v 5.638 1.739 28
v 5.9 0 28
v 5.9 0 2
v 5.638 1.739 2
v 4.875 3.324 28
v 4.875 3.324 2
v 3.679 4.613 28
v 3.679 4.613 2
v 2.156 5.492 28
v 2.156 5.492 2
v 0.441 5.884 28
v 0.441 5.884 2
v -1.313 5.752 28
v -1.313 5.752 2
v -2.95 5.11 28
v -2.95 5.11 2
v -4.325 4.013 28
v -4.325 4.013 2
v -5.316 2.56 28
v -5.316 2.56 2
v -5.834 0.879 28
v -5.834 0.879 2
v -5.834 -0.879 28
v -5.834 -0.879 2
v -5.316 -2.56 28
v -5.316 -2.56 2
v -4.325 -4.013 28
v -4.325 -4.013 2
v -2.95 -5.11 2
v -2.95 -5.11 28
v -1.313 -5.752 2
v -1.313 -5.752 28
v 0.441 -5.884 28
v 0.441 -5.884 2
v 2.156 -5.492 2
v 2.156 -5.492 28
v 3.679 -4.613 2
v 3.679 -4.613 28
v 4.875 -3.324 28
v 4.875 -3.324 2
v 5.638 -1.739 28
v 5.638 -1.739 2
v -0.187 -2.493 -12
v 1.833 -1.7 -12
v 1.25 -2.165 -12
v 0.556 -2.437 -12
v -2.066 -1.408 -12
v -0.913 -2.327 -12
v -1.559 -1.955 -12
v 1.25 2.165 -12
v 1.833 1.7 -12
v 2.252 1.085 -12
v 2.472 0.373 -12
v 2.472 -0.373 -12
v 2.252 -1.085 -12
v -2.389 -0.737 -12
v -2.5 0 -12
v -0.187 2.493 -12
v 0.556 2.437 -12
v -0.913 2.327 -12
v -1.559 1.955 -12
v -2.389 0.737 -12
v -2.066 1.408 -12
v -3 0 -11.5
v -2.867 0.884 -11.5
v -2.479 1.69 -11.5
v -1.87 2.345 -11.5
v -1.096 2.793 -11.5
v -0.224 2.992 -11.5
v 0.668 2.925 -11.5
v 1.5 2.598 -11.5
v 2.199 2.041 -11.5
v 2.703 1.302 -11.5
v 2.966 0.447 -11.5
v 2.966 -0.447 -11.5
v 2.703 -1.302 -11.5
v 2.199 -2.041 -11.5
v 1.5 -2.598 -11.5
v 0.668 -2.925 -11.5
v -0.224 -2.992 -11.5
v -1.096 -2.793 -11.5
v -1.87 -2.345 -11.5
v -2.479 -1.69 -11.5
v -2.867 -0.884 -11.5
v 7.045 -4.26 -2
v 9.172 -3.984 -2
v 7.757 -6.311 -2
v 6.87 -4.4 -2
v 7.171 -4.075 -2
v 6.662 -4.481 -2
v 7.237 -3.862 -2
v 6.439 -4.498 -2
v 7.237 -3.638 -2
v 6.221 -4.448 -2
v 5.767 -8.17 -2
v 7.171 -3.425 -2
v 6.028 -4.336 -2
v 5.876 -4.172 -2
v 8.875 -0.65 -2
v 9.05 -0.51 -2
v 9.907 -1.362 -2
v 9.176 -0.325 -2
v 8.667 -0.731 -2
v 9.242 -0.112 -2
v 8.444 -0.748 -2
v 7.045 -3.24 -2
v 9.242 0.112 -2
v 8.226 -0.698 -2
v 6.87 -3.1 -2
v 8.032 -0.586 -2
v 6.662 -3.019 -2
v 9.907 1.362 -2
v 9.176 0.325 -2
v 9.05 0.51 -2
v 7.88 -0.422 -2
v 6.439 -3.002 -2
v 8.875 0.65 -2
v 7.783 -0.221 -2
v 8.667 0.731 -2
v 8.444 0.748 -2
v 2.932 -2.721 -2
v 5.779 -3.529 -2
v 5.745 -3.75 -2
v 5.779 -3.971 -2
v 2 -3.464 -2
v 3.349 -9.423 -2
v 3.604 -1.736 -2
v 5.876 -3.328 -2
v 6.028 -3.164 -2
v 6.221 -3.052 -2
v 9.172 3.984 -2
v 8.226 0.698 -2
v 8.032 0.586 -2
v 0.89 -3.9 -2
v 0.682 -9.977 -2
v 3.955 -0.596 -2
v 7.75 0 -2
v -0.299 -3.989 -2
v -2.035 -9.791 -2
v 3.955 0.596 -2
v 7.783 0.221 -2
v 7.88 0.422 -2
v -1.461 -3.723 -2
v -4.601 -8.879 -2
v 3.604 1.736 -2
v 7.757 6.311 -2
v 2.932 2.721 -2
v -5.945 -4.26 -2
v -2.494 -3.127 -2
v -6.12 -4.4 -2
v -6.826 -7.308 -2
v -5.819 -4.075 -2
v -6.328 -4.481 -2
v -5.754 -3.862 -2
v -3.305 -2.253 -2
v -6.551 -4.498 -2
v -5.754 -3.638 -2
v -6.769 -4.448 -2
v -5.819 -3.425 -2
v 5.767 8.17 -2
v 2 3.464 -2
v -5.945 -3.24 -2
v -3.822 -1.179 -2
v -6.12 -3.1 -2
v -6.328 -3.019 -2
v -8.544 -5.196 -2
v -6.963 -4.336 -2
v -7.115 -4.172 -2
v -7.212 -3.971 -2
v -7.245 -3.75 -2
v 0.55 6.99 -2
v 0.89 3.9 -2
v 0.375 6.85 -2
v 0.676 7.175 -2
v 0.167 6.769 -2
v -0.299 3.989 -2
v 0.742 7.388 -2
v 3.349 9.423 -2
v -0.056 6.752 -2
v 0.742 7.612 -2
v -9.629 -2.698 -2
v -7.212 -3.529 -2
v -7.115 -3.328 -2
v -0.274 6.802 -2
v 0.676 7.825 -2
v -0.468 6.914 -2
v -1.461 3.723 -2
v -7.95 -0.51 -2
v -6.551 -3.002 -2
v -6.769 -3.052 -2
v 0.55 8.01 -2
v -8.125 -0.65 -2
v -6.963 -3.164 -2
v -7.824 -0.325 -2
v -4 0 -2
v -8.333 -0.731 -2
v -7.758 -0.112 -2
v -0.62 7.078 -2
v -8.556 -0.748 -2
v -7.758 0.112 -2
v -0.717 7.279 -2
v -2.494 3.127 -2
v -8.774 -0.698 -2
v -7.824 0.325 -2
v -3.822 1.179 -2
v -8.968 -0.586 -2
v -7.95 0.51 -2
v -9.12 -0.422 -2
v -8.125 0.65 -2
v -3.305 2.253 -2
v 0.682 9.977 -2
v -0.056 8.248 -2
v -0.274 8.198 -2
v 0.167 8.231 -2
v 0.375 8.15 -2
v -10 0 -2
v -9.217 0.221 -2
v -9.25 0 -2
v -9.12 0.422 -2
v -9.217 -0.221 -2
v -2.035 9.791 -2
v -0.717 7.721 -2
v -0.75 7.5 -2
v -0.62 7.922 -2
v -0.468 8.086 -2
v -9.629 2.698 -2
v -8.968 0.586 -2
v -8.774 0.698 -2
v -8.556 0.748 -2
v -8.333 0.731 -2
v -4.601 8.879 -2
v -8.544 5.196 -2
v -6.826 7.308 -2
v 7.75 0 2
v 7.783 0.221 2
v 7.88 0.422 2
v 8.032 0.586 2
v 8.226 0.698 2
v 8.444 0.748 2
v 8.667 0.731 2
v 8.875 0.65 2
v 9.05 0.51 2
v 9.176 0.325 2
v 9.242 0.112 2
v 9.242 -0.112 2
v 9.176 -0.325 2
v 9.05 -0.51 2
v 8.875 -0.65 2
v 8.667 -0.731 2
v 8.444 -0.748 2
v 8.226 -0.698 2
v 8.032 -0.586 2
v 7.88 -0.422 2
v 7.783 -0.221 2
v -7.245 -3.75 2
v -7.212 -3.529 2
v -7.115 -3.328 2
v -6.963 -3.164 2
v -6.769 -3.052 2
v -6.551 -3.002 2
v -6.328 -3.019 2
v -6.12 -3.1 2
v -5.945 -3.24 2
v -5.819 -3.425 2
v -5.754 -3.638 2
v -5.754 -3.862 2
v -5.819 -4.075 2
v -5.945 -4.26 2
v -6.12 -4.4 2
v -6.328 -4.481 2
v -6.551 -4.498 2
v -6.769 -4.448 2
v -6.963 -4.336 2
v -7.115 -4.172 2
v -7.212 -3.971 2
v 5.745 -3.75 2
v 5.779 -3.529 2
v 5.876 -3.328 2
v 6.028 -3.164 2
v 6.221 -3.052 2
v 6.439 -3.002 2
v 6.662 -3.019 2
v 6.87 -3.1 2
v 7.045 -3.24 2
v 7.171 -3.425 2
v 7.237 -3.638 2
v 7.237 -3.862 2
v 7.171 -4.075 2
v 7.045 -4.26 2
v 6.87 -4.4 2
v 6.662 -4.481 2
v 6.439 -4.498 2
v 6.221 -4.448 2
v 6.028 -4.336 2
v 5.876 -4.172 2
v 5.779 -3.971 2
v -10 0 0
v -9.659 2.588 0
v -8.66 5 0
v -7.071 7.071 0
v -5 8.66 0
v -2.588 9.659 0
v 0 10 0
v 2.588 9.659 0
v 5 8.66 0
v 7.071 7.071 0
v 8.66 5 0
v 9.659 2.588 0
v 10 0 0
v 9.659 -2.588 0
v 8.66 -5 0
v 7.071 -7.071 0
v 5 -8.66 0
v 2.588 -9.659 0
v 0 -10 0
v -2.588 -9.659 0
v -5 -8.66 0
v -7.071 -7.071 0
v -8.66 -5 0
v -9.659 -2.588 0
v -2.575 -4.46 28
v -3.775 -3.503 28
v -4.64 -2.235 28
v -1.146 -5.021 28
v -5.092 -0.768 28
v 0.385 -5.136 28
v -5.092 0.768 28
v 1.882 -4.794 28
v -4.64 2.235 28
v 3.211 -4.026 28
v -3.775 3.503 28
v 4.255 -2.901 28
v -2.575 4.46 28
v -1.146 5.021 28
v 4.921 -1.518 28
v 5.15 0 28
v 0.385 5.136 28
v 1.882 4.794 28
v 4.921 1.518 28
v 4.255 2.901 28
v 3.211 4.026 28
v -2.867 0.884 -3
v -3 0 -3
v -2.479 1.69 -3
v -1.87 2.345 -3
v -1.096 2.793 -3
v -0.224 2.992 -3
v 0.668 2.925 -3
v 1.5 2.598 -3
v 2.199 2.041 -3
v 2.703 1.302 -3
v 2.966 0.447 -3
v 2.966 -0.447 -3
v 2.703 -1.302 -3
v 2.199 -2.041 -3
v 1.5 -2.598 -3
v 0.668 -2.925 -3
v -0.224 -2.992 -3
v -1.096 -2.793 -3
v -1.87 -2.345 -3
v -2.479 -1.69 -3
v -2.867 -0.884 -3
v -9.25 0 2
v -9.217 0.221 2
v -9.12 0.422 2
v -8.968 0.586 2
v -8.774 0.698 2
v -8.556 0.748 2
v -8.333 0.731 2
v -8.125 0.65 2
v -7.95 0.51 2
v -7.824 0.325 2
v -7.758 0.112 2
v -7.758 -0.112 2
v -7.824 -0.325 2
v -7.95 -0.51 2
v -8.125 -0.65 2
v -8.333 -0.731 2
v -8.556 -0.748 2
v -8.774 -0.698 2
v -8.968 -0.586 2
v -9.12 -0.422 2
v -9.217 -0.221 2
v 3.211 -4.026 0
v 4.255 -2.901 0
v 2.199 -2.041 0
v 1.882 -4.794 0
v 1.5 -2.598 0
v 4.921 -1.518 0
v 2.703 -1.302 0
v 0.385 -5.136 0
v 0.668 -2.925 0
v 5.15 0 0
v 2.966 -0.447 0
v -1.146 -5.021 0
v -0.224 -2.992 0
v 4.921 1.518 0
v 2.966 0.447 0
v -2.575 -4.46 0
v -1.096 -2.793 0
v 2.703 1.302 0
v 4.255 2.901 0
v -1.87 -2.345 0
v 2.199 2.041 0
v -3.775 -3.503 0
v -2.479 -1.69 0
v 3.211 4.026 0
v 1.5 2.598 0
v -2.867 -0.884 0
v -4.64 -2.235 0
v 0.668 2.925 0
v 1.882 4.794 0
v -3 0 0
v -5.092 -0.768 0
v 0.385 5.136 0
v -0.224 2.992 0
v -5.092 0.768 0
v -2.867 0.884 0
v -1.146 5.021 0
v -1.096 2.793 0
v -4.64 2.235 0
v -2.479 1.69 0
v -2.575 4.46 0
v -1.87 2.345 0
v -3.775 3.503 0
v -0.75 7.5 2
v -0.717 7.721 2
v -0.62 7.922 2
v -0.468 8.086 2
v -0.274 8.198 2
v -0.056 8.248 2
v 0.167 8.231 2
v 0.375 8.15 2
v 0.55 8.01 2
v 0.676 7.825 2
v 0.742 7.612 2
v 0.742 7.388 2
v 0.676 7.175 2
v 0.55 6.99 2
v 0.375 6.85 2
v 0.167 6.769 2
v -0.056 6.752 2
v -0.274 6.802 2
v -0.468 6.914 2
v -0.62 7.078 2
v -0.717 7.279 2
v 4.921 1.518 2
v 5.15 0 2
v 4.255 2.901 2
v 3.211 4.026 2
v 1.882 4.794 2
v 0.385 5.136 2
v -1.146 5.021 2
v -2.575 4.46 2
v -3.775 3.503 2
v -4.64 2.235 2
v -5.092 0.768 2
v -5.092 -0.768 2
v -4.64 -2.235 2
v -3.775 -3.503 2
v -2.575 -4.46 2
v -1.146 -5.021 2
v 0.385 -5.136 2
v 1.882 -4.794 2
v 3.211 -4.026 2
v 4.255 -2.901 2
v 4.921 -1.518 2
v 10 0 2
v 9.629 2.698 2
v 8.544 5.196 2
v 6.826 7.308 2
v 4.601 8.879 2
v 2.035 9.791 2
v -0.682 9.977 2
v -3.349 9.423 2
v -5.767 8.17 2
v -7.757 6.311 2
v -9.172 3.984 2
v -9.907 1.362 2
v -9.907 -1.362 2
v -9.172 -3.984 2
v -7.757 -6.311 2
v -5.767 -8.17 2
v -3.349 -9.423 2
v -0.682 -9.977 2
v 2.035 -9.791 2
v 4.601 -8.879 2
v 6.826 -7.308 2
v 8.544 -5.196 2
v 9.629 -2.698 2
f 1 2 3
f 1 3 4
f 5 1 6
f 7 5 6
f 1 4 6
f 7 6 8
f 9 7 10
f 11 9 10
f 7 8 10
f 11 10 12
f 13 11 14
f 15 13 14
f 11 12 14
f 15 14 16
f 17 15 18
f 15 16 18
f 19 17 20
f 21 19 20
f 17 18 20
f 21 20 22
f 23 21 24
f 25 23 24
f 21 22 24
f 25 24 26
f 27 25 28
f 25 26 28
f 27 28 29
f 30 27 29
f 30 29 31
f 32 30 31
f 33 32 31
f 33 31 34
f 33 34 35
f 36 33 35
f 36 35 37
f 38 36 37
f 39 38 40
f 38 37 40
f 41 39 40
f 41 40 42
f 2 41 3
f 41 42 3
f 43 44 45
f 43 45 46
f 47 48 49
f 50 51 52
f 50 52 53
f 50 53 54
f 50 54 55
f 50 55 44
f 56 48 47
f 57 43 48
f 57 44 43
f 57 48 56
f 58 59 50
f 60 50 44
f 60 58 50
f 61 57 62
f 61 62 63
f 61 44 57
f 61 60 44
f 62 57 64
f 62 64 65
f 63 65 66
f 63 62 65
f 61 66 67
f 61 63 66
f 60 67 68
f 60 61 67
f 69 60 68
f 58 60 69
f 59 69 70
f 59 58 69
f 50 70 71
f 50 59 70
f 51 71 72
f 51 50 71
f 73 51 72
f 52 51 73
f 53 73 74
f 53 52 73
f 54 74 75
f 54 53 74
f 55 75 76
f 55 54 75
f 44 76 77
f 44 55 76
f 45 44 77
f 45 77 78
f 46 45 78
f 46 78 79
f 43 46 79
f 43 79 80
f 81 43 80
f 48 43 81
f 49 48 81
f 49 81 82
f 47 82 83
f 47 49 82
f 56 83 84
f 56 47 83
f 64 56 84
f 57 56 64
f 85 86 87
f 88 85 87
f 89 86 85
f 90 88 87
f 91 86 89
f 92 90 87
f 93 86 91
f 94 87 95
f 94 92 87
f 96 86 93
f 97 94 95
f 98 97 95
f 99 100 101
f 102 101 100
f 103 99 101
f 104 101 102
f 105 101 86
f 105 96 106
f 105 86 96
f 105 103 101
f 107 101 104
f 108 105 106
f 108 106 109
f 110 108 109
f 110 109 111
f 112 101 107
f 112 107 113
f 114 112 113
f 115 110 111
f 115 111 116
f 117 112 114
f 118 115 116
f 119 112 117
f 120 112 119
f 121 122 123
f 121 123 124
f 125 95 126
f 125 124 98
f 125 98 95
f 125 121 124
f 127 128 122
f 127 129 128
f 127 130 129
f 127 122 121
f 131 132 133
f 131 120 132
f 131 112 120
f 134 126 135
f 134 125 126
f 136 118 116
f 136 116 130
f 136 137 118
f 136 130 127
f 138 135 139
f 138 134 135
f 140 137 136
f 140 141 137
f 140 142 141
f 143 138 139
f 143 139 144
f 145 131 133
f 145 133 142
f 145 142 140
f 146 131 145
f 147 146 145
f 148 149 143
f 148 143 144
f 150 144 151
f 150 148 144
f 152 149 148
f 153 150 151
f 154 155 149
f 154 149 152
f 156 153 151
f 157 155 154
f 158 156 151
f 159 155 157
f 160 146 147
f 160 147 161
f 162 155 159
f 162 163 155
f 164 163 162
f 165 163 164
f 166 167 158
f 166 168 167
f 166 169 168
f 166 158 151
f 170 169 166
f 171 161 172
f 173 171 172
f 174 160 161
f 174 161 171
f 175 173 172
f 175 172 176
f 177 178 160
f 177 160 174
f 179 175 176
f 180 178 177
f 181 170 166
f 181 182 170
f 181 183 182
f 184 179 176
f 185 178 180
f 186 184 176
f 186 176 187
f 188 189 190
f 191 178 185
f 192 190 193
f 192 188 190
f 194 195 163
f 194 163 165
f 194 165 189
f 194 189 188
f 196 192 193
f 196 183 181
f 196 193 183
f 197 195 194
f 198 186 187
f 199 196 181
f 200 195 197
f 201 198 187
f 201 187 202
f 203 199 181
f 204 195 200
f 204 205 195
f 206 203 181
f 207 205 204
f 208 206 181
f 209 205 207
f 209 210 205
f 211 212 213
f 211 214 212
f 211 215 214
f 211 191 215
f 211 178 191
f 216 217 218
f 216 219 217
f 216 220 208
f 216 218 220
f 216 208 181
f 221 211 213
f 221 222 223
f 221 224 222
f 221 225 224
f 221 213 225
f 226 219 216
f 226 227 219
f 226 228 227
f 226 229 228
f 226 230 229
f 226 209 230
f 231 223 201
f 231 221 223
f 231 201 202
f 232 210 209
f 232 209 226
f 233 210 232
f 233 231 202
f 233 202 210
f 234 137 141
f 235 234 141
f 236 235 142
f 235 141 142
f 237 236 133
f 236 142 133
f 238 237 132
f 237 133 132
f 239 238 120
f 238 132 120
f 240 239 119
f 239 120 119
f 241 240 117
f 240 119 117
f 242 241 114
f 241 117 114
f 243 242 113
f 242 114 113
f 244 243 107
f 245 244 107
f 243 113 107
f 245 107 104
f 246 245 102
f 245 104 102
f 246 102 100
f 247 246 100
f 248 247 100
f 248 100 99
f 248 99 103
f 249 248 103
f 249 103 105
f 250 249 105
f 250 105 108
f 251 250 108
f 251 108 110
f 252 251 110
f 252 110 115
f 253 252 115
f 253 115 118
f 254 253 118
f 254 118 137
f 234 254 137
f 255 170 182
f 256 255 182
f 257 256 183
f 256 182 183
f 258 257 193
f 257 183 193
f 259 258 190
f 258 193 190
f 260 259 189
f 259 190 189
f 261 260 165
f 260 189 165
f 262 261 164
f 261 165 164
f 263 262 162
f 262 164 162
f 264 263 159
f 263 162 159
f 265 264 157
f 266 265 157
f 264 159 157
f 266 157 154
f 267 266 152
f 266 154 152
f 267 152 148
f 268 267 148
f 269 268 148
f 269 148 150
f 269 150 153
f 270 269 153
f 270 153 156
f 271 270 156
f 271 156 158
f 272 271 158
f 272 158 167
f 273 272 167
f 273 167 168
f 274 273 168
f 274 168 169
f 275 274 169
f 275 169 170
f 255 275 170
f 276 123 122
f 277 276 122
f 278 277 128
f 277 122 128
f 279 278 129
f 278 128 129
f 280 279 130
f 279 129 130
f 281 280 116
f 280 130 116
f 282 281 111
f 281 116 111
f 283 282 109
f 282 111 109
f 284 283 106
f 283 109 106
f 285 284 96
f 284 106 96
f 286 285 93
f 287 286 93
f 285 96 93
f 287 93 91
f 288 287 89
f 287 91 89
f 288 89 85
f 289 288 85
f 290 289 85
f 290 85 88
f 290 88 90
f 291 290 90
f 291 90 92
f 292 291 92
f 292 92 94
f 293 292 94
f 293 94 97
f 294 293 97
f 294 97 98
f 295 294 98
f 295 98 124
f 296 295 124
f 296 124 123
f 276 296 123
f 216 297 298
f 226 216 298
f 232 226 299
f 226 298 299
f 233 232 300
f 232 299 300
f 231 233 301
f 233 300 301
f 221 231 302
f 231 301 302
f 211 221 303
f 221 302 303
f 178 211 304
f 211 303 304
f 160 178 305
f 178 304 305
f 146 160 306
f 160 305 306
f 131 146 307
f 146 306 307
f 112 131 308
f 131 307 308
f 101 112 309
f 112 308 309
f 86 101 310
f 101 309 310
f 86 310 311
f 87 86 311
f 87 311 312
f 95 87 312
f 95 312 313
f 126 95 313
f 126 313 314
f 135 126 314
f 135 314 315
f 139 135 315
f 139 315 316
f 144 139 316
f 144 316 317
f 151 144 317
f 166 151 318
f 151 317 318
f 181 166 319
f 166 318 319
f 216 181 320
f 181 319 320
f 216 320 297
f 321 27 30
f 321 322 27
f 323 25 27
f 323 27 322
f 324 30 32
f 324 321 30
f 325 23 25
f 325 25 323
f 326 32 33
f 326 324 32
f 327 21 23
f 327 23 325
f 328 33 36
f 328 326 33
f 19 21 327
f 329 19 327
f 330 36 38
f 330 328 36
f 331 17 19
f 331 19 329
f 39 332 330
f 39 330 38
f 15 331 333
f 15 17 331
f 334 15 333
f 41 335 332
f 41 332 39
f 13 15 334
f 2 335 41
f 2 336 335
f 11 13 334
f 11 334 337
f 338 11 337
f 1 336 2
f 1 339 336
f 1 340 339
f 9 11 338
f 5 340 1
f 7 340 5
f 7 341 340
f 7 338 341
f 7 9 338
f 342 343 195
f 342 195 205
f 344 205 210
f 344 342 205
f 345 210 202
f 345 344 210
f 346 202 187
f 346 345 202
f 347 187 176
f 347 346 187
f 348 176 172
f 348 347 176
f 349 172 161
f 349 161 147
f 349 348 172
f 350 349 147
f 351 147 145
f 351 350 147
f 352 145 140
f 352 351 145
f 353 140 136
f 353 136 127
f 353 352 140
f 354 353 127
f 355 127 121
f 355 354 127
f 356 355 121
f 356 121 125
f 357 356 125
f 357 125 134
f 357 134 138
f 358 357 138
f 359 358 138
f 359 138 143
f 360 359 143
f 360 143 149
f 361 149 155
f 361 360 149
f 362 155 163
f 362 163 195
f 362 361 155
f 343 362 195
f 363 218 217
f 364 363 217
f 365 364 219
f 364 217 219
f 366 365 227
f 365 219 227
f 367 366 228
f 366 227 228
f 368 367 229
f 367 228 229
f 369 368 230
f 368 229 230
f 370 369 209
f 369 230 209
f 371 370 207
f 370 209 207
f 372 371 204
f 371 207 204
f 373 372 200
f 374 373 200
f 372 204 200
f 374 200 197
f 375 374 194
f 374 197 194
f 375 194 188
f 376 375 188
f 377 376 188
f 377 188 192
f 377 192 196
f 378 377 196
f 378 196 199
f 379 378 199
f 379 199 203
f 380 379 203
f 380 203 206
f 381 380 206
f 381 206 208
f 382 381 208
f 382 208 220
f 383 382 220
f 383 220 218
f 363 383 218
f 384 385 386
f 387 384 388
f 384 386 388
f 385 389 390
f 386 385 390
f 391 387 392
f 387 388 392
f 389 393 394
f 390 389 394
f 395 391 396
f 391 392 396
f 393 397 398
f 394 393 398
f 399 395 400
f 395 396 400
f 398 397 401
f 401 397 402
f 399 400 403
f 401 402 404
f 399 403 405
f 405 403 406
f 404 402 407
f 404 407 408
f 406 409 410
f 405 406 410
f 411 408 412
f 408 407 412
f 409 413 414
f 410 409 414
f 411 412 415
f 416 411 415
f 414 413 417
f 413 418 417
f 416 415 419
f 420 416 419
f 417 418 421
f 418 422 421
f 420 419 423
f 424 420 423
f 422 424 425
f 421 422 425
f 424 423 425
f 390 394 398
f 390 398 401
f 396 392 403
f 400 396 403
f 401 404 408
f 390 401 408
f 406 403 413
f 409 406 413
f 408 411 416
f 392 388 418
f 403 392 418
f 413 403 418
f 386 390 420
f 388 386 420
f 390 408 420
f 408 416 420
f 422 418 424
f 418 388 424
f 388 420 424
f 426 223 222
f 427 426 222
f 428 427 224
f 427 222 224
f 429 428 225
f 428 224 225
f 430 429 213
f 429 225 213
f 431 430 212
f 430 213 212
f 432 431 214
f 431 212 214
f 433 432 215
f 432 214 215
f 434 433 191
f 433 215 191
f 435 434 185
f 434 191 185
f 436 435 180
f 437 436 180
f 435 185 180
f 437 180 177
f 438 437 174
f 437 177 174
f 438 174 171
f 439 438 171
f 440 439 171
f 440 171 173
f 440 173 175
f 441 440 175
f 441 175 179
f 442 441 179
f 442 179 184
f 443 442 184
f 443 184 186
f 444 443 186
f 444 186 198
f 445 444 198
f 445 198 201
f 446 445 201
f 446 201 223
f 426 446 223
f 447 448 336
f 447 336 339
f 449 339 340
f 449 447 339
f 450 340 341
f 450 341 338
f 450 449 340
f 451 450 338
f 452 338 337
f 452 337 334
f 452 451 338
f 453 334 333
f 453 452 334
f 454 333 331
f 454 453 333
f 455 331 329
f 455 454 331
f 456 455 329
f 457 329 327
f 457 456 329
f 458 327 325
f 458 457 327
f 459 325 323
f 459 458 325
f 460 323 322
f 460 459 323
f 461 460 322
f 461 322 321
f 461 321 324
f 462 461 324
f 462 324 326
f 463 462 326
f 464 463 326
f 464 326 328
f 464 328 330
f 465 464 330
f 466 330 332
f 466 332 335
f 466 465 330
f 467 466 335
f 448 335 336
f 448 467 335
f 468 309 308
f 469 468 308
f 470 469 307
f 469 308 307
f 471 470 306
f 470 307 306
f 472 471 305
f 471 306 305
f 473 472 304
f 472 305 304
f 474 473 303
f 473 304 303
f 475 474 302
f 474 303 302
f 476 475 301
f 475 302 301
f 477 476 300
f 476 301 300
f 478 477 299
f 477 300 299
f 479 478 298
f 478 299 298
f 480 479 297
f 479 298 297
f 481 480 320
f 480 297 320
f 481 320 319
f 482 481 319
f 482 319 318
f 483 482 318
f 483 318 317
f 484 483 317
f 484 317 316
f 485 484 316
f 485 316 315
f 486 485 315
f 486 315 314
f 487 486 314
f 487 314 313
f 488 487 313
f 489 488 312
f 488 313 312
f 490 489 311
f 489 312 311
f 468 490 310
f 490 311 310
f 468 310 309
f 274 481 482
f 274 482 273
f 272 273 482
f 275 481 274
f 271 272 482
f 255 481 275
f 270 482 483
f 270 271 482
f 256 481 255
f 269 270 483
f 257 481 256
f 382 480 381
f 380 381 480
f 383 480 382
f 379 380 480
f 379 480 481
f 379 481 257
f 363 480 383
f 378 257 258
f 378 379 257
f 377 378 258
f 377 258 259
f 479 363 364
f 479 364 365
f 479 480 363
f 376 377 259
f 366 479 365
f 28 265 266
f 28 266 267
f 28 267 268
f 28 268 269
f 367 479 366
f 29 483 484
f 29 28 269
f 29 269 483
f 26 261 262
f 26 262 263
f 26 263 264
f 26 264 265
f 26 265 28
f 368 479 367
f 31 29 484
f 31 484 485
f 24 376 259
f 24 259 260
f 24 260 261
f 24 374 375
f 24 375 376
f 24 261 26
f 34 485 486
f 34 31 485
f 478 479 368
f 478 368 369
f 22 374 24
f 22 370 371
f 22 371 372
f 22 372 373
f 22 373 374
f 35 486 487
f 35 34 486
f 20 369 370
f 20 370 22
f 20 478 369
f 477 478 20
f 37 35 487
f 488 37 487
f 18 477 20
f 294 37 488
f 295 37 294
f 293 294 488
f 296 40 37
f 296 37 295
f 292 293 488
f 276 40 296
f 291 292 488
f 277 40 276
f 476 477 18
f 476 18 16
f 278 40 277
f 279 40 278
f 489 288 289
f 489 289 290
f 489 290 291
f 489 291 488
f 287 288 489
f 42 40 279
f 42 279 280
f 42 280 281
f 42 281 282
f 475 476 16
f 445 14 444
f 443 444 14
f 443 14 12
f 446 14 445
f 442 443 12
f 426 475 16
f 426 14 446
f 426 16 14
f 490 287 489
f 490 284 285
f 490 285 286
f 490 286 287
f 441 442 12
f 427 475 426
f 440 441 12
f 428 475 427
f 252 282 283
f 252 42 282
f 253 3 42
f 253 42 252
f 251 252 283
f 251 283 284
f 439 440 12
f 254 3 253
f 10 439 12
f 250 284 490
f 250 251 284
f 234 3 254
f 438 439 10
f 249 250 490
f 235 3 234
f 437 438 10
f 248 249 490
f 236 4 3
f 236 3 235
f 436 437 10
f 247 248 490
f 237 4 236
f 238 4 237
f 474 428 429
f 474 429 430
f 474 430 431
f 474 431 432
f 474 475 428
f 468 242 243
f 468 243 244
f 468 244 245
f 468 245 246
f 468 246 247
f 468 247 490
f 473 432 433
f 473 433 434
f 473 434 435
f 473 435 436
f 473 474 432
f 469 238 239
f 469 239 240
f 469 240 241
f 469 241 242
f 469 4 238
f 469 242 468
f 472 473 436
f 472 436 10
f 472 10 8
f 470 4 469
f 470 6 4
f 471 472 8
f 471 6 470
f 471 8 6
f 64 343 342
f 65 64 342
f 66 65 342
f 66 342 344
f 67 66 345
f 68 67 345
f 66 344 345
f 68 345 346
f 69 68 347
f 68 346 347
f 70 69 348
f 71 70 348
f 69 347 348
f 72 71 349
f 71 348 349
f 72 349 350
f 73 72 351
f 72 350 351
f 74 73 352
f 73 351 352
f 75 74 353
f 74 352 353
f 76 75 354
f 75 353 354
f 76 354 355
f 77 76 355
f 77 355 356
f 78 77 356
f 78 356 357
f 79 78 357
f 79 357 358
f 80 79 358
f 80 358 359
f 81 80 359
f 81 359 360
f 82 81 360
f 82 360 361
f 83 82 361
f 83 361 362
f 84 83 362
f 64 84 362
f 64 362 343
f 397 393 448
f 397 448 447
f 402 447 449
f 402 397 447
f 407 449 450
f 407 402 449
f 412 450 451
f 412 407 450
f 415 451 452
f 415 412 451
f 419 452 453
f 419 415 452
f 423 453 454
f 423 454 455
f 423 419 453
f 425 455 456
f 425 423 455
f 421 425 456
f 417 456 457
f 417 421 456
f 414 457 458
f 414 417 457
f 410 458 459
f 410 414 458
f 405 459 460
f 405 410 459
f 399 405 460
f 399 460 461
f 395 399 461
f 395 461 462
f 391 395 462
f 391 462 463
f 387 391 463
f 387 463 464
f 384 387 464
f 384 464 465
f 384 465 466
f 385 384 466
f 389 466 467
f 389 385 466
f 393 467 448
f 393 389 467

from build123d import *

# Parameters (mm, degrees)
SKETCH1_R           = 10
SKETCH1_R_2         = 5.15
BOSS_EXTRUDE1_DEPTH = 2
SKETCH3_R           = 3
BOSS_EXTRUDE2_DEPTH = 12
SKETCH4_R           = 10
SKETCH4_R_2         = 3
BOSS_EXTRUDE3_DEPTH = 2
CHAMFER2_SIZE       = 1
CHAMFER4_SIZE       = 0.5
CUT_EXTRUDE1_REACH  = 6
SKETCH5_R           = 0.75
SKETCH6_R           = 5.9
SKETCH6_R_2         = 5.15
BOSS_EXTRUDE4_DEPTH = 26
CUT_EXTRUDE2_REACH  = 32
SKETCH7_R           = 0.75


with BuildPart() as part:
    # Sketch1 → Boss-Extrude1 (new body)
    with BuildSketch(Plane.XY):
        Circle(SKETCH1_R)
        Circle(SKETCH1_R_2, mode=Mode.SUBTRACT)
    extrude(amount=BOSS_EXTRUDE1_DEPTH)



with BuildPart() as body_2:
    # Sketch3 → Boss-Extrude2 (new body)
    with BuildSketch(Plane(origin=(0, 0, 0), x_dir=(-1, 0, 0), z_dir=(0, 0, -1))):
        Circle(SKETCH3_R)
    extrude(amount=BOSS_EXTRUDE2_DEPTH)


with BuildPart() as part_1:
    add(part.part)

    add(body_2.part)  # Boss-Extrude3 merges body 2
    # Sketch4 → Boss-Extrude3 (add)
    with BuildSketch(Plane(origin=(0, 0, 0), x_dir=(-1, 0, 0), z_dir=(0, 0, -1))):
        Circle(SKETCH4_R)
        Circle(SKETCH4_R_2, mode=Mode.SUBTRACT)
    extrude(amount=BOSS_EXTRUDE3_DEPTH)

    # Chamfer2
    chamfer2_edges = [part_1.edges().sort_by_distance(p)[0] for p in [
        (3, 0, -2),
    ]]
    chamfer(chamfer2_edges, length=CHAMFER2_SIZE)

    # Chamfer4
    chamfer4_edges = [part_1.edges().sort_by_distance(p)[0] for p in [
        (3, 0, -12),
    ]]
    chamfer(chamfer4_edges, length=CHAMFER4_SIZE)

    # Sketch5 → Cut-Extrude1 (cut, up to next)
    with BuildSketch(Plane(origin=(0, 0, -2), x_dir=(-1, 0, 0), z_dir=(0, 0, -1)), mode=Mode.PRIVATE) as cut_extrude1_sk1:
        with Locations((-8.5, 0)):
            Circle(SKETCH5_R)
    cut_extrude1_tool1 = extrude(cut_extrude1_sk1.sketch, amount=-CUT_EXTRUDE1_REACH, mode=Mode.PRIVATE) & part_1.part
    add(cut_extrude1_tool1.solids().sort_by_distance((8.5, 0, -2))[0], mode=Mode.SUBTRACT)
    # Sketch5 → Cut-Extrude1 (cut, up to next)
    with BuildSketch(Plane(origin=(0, 0, -2), x_dir=(-1, 0, 0), z_dir=(0, 0, -1)), mode=Mode.PRIVATE) as cut_extrude1_sk2:
        with Locations((8.5, 0)):
            Circle(SKETCH5_R)
    cut_extrude1_tool2 = extrude(cut_extrude1_sk2.sketch, amount=-CUT_EXTRUDE1_REACH, mode=Mode.PRIVATE) & part_1.part
    add(cut_extrude1_tool2.solids().sort_by_distance((-8.5, 0, -2))[0], mode=Mode.SUBTRACT)

    # Sketch6 → Boss-Extrude4 (add)
    with BuildSketch(Plane.XY.offset(2)):
        Circle(SKETCH6_R)
        Circle(SKETCH6_R_2, mode=Mode.SUBTRACT)
    extrude(amount=BOSS_EXTRUDE4_DEPTH)

    # Sketch7 → Cut-Extrude2 (cut, up to next)
    with BuildSketch(Plane(origin=(0, 0, -2), x_dir=(-1, 0, 0), z_dir=(0, 0, -1)), mode=Mode.PRIVATE) as cut_extrude2_sk1:
        with Locations((0, 7.5)):
            Circle(SKETCH7_R)
    cut_extrude2_tool1 = extrude(cut_extrude2_sk1.sketch, amount=-CUT_EXTRUDE2_REACH, mode=Mode.PRIVATE) & part_1.part
    add(cut_extrude2_tool1.solids().sort_by_distance((0, 7.5, -2))[0], mode=Mode.SUBTRACT)
    # Sketch7 → Cut-Extrude2 (cut, up to next)
    with BuildSketch(Plane(origin=(0, 0, -2), x_dir=(-1, 0, 0), z_dir=(0, 0, -1)), mode=Mode.PRIVATE) as cut_extrude2_sk2:
        with Locations((6.495190528, -3.75)):
            Circle(SKETCH7_R)
    cut_extrude2_tool2 = extrude(cut_extrude2_sk2.sketch, amount=-CUT_EXTRUDE2_REACH, mode=Mode.PRIVATE) & part_1.part
    add(cut_extrude2_tool2.solids().sort_by_distance((-6.495191, -3.75, -2))[0], mode=Mode.SUBTRACT)
    # Sketch7 → Cut-Extrude2 (cut, up to next)
    with BuildSketch(Plane(origin=(0, 0, -2), x_dir=(-1, 0, 0), z_dir=(0, 0, -1)), mode=Mode.PRIVATE) as cut_extrude2_sk3:
        with Locations((-6.495190528, -3.75)):
            Circle(SKETCH7_R)
    cut_extrude2_tool3 = extrude(cut_extrude2_sk3.sketch, amount=-CUT_EXTRUDE2_REACH, mode=Mode.PRIVATE) & part_1.part
    add(cut_extrude2_tool3.solids().sort_by_distance((6.495191, -3.75, -2))[0], mode=Mode.SUBTRACT)


solid = part_1.part
